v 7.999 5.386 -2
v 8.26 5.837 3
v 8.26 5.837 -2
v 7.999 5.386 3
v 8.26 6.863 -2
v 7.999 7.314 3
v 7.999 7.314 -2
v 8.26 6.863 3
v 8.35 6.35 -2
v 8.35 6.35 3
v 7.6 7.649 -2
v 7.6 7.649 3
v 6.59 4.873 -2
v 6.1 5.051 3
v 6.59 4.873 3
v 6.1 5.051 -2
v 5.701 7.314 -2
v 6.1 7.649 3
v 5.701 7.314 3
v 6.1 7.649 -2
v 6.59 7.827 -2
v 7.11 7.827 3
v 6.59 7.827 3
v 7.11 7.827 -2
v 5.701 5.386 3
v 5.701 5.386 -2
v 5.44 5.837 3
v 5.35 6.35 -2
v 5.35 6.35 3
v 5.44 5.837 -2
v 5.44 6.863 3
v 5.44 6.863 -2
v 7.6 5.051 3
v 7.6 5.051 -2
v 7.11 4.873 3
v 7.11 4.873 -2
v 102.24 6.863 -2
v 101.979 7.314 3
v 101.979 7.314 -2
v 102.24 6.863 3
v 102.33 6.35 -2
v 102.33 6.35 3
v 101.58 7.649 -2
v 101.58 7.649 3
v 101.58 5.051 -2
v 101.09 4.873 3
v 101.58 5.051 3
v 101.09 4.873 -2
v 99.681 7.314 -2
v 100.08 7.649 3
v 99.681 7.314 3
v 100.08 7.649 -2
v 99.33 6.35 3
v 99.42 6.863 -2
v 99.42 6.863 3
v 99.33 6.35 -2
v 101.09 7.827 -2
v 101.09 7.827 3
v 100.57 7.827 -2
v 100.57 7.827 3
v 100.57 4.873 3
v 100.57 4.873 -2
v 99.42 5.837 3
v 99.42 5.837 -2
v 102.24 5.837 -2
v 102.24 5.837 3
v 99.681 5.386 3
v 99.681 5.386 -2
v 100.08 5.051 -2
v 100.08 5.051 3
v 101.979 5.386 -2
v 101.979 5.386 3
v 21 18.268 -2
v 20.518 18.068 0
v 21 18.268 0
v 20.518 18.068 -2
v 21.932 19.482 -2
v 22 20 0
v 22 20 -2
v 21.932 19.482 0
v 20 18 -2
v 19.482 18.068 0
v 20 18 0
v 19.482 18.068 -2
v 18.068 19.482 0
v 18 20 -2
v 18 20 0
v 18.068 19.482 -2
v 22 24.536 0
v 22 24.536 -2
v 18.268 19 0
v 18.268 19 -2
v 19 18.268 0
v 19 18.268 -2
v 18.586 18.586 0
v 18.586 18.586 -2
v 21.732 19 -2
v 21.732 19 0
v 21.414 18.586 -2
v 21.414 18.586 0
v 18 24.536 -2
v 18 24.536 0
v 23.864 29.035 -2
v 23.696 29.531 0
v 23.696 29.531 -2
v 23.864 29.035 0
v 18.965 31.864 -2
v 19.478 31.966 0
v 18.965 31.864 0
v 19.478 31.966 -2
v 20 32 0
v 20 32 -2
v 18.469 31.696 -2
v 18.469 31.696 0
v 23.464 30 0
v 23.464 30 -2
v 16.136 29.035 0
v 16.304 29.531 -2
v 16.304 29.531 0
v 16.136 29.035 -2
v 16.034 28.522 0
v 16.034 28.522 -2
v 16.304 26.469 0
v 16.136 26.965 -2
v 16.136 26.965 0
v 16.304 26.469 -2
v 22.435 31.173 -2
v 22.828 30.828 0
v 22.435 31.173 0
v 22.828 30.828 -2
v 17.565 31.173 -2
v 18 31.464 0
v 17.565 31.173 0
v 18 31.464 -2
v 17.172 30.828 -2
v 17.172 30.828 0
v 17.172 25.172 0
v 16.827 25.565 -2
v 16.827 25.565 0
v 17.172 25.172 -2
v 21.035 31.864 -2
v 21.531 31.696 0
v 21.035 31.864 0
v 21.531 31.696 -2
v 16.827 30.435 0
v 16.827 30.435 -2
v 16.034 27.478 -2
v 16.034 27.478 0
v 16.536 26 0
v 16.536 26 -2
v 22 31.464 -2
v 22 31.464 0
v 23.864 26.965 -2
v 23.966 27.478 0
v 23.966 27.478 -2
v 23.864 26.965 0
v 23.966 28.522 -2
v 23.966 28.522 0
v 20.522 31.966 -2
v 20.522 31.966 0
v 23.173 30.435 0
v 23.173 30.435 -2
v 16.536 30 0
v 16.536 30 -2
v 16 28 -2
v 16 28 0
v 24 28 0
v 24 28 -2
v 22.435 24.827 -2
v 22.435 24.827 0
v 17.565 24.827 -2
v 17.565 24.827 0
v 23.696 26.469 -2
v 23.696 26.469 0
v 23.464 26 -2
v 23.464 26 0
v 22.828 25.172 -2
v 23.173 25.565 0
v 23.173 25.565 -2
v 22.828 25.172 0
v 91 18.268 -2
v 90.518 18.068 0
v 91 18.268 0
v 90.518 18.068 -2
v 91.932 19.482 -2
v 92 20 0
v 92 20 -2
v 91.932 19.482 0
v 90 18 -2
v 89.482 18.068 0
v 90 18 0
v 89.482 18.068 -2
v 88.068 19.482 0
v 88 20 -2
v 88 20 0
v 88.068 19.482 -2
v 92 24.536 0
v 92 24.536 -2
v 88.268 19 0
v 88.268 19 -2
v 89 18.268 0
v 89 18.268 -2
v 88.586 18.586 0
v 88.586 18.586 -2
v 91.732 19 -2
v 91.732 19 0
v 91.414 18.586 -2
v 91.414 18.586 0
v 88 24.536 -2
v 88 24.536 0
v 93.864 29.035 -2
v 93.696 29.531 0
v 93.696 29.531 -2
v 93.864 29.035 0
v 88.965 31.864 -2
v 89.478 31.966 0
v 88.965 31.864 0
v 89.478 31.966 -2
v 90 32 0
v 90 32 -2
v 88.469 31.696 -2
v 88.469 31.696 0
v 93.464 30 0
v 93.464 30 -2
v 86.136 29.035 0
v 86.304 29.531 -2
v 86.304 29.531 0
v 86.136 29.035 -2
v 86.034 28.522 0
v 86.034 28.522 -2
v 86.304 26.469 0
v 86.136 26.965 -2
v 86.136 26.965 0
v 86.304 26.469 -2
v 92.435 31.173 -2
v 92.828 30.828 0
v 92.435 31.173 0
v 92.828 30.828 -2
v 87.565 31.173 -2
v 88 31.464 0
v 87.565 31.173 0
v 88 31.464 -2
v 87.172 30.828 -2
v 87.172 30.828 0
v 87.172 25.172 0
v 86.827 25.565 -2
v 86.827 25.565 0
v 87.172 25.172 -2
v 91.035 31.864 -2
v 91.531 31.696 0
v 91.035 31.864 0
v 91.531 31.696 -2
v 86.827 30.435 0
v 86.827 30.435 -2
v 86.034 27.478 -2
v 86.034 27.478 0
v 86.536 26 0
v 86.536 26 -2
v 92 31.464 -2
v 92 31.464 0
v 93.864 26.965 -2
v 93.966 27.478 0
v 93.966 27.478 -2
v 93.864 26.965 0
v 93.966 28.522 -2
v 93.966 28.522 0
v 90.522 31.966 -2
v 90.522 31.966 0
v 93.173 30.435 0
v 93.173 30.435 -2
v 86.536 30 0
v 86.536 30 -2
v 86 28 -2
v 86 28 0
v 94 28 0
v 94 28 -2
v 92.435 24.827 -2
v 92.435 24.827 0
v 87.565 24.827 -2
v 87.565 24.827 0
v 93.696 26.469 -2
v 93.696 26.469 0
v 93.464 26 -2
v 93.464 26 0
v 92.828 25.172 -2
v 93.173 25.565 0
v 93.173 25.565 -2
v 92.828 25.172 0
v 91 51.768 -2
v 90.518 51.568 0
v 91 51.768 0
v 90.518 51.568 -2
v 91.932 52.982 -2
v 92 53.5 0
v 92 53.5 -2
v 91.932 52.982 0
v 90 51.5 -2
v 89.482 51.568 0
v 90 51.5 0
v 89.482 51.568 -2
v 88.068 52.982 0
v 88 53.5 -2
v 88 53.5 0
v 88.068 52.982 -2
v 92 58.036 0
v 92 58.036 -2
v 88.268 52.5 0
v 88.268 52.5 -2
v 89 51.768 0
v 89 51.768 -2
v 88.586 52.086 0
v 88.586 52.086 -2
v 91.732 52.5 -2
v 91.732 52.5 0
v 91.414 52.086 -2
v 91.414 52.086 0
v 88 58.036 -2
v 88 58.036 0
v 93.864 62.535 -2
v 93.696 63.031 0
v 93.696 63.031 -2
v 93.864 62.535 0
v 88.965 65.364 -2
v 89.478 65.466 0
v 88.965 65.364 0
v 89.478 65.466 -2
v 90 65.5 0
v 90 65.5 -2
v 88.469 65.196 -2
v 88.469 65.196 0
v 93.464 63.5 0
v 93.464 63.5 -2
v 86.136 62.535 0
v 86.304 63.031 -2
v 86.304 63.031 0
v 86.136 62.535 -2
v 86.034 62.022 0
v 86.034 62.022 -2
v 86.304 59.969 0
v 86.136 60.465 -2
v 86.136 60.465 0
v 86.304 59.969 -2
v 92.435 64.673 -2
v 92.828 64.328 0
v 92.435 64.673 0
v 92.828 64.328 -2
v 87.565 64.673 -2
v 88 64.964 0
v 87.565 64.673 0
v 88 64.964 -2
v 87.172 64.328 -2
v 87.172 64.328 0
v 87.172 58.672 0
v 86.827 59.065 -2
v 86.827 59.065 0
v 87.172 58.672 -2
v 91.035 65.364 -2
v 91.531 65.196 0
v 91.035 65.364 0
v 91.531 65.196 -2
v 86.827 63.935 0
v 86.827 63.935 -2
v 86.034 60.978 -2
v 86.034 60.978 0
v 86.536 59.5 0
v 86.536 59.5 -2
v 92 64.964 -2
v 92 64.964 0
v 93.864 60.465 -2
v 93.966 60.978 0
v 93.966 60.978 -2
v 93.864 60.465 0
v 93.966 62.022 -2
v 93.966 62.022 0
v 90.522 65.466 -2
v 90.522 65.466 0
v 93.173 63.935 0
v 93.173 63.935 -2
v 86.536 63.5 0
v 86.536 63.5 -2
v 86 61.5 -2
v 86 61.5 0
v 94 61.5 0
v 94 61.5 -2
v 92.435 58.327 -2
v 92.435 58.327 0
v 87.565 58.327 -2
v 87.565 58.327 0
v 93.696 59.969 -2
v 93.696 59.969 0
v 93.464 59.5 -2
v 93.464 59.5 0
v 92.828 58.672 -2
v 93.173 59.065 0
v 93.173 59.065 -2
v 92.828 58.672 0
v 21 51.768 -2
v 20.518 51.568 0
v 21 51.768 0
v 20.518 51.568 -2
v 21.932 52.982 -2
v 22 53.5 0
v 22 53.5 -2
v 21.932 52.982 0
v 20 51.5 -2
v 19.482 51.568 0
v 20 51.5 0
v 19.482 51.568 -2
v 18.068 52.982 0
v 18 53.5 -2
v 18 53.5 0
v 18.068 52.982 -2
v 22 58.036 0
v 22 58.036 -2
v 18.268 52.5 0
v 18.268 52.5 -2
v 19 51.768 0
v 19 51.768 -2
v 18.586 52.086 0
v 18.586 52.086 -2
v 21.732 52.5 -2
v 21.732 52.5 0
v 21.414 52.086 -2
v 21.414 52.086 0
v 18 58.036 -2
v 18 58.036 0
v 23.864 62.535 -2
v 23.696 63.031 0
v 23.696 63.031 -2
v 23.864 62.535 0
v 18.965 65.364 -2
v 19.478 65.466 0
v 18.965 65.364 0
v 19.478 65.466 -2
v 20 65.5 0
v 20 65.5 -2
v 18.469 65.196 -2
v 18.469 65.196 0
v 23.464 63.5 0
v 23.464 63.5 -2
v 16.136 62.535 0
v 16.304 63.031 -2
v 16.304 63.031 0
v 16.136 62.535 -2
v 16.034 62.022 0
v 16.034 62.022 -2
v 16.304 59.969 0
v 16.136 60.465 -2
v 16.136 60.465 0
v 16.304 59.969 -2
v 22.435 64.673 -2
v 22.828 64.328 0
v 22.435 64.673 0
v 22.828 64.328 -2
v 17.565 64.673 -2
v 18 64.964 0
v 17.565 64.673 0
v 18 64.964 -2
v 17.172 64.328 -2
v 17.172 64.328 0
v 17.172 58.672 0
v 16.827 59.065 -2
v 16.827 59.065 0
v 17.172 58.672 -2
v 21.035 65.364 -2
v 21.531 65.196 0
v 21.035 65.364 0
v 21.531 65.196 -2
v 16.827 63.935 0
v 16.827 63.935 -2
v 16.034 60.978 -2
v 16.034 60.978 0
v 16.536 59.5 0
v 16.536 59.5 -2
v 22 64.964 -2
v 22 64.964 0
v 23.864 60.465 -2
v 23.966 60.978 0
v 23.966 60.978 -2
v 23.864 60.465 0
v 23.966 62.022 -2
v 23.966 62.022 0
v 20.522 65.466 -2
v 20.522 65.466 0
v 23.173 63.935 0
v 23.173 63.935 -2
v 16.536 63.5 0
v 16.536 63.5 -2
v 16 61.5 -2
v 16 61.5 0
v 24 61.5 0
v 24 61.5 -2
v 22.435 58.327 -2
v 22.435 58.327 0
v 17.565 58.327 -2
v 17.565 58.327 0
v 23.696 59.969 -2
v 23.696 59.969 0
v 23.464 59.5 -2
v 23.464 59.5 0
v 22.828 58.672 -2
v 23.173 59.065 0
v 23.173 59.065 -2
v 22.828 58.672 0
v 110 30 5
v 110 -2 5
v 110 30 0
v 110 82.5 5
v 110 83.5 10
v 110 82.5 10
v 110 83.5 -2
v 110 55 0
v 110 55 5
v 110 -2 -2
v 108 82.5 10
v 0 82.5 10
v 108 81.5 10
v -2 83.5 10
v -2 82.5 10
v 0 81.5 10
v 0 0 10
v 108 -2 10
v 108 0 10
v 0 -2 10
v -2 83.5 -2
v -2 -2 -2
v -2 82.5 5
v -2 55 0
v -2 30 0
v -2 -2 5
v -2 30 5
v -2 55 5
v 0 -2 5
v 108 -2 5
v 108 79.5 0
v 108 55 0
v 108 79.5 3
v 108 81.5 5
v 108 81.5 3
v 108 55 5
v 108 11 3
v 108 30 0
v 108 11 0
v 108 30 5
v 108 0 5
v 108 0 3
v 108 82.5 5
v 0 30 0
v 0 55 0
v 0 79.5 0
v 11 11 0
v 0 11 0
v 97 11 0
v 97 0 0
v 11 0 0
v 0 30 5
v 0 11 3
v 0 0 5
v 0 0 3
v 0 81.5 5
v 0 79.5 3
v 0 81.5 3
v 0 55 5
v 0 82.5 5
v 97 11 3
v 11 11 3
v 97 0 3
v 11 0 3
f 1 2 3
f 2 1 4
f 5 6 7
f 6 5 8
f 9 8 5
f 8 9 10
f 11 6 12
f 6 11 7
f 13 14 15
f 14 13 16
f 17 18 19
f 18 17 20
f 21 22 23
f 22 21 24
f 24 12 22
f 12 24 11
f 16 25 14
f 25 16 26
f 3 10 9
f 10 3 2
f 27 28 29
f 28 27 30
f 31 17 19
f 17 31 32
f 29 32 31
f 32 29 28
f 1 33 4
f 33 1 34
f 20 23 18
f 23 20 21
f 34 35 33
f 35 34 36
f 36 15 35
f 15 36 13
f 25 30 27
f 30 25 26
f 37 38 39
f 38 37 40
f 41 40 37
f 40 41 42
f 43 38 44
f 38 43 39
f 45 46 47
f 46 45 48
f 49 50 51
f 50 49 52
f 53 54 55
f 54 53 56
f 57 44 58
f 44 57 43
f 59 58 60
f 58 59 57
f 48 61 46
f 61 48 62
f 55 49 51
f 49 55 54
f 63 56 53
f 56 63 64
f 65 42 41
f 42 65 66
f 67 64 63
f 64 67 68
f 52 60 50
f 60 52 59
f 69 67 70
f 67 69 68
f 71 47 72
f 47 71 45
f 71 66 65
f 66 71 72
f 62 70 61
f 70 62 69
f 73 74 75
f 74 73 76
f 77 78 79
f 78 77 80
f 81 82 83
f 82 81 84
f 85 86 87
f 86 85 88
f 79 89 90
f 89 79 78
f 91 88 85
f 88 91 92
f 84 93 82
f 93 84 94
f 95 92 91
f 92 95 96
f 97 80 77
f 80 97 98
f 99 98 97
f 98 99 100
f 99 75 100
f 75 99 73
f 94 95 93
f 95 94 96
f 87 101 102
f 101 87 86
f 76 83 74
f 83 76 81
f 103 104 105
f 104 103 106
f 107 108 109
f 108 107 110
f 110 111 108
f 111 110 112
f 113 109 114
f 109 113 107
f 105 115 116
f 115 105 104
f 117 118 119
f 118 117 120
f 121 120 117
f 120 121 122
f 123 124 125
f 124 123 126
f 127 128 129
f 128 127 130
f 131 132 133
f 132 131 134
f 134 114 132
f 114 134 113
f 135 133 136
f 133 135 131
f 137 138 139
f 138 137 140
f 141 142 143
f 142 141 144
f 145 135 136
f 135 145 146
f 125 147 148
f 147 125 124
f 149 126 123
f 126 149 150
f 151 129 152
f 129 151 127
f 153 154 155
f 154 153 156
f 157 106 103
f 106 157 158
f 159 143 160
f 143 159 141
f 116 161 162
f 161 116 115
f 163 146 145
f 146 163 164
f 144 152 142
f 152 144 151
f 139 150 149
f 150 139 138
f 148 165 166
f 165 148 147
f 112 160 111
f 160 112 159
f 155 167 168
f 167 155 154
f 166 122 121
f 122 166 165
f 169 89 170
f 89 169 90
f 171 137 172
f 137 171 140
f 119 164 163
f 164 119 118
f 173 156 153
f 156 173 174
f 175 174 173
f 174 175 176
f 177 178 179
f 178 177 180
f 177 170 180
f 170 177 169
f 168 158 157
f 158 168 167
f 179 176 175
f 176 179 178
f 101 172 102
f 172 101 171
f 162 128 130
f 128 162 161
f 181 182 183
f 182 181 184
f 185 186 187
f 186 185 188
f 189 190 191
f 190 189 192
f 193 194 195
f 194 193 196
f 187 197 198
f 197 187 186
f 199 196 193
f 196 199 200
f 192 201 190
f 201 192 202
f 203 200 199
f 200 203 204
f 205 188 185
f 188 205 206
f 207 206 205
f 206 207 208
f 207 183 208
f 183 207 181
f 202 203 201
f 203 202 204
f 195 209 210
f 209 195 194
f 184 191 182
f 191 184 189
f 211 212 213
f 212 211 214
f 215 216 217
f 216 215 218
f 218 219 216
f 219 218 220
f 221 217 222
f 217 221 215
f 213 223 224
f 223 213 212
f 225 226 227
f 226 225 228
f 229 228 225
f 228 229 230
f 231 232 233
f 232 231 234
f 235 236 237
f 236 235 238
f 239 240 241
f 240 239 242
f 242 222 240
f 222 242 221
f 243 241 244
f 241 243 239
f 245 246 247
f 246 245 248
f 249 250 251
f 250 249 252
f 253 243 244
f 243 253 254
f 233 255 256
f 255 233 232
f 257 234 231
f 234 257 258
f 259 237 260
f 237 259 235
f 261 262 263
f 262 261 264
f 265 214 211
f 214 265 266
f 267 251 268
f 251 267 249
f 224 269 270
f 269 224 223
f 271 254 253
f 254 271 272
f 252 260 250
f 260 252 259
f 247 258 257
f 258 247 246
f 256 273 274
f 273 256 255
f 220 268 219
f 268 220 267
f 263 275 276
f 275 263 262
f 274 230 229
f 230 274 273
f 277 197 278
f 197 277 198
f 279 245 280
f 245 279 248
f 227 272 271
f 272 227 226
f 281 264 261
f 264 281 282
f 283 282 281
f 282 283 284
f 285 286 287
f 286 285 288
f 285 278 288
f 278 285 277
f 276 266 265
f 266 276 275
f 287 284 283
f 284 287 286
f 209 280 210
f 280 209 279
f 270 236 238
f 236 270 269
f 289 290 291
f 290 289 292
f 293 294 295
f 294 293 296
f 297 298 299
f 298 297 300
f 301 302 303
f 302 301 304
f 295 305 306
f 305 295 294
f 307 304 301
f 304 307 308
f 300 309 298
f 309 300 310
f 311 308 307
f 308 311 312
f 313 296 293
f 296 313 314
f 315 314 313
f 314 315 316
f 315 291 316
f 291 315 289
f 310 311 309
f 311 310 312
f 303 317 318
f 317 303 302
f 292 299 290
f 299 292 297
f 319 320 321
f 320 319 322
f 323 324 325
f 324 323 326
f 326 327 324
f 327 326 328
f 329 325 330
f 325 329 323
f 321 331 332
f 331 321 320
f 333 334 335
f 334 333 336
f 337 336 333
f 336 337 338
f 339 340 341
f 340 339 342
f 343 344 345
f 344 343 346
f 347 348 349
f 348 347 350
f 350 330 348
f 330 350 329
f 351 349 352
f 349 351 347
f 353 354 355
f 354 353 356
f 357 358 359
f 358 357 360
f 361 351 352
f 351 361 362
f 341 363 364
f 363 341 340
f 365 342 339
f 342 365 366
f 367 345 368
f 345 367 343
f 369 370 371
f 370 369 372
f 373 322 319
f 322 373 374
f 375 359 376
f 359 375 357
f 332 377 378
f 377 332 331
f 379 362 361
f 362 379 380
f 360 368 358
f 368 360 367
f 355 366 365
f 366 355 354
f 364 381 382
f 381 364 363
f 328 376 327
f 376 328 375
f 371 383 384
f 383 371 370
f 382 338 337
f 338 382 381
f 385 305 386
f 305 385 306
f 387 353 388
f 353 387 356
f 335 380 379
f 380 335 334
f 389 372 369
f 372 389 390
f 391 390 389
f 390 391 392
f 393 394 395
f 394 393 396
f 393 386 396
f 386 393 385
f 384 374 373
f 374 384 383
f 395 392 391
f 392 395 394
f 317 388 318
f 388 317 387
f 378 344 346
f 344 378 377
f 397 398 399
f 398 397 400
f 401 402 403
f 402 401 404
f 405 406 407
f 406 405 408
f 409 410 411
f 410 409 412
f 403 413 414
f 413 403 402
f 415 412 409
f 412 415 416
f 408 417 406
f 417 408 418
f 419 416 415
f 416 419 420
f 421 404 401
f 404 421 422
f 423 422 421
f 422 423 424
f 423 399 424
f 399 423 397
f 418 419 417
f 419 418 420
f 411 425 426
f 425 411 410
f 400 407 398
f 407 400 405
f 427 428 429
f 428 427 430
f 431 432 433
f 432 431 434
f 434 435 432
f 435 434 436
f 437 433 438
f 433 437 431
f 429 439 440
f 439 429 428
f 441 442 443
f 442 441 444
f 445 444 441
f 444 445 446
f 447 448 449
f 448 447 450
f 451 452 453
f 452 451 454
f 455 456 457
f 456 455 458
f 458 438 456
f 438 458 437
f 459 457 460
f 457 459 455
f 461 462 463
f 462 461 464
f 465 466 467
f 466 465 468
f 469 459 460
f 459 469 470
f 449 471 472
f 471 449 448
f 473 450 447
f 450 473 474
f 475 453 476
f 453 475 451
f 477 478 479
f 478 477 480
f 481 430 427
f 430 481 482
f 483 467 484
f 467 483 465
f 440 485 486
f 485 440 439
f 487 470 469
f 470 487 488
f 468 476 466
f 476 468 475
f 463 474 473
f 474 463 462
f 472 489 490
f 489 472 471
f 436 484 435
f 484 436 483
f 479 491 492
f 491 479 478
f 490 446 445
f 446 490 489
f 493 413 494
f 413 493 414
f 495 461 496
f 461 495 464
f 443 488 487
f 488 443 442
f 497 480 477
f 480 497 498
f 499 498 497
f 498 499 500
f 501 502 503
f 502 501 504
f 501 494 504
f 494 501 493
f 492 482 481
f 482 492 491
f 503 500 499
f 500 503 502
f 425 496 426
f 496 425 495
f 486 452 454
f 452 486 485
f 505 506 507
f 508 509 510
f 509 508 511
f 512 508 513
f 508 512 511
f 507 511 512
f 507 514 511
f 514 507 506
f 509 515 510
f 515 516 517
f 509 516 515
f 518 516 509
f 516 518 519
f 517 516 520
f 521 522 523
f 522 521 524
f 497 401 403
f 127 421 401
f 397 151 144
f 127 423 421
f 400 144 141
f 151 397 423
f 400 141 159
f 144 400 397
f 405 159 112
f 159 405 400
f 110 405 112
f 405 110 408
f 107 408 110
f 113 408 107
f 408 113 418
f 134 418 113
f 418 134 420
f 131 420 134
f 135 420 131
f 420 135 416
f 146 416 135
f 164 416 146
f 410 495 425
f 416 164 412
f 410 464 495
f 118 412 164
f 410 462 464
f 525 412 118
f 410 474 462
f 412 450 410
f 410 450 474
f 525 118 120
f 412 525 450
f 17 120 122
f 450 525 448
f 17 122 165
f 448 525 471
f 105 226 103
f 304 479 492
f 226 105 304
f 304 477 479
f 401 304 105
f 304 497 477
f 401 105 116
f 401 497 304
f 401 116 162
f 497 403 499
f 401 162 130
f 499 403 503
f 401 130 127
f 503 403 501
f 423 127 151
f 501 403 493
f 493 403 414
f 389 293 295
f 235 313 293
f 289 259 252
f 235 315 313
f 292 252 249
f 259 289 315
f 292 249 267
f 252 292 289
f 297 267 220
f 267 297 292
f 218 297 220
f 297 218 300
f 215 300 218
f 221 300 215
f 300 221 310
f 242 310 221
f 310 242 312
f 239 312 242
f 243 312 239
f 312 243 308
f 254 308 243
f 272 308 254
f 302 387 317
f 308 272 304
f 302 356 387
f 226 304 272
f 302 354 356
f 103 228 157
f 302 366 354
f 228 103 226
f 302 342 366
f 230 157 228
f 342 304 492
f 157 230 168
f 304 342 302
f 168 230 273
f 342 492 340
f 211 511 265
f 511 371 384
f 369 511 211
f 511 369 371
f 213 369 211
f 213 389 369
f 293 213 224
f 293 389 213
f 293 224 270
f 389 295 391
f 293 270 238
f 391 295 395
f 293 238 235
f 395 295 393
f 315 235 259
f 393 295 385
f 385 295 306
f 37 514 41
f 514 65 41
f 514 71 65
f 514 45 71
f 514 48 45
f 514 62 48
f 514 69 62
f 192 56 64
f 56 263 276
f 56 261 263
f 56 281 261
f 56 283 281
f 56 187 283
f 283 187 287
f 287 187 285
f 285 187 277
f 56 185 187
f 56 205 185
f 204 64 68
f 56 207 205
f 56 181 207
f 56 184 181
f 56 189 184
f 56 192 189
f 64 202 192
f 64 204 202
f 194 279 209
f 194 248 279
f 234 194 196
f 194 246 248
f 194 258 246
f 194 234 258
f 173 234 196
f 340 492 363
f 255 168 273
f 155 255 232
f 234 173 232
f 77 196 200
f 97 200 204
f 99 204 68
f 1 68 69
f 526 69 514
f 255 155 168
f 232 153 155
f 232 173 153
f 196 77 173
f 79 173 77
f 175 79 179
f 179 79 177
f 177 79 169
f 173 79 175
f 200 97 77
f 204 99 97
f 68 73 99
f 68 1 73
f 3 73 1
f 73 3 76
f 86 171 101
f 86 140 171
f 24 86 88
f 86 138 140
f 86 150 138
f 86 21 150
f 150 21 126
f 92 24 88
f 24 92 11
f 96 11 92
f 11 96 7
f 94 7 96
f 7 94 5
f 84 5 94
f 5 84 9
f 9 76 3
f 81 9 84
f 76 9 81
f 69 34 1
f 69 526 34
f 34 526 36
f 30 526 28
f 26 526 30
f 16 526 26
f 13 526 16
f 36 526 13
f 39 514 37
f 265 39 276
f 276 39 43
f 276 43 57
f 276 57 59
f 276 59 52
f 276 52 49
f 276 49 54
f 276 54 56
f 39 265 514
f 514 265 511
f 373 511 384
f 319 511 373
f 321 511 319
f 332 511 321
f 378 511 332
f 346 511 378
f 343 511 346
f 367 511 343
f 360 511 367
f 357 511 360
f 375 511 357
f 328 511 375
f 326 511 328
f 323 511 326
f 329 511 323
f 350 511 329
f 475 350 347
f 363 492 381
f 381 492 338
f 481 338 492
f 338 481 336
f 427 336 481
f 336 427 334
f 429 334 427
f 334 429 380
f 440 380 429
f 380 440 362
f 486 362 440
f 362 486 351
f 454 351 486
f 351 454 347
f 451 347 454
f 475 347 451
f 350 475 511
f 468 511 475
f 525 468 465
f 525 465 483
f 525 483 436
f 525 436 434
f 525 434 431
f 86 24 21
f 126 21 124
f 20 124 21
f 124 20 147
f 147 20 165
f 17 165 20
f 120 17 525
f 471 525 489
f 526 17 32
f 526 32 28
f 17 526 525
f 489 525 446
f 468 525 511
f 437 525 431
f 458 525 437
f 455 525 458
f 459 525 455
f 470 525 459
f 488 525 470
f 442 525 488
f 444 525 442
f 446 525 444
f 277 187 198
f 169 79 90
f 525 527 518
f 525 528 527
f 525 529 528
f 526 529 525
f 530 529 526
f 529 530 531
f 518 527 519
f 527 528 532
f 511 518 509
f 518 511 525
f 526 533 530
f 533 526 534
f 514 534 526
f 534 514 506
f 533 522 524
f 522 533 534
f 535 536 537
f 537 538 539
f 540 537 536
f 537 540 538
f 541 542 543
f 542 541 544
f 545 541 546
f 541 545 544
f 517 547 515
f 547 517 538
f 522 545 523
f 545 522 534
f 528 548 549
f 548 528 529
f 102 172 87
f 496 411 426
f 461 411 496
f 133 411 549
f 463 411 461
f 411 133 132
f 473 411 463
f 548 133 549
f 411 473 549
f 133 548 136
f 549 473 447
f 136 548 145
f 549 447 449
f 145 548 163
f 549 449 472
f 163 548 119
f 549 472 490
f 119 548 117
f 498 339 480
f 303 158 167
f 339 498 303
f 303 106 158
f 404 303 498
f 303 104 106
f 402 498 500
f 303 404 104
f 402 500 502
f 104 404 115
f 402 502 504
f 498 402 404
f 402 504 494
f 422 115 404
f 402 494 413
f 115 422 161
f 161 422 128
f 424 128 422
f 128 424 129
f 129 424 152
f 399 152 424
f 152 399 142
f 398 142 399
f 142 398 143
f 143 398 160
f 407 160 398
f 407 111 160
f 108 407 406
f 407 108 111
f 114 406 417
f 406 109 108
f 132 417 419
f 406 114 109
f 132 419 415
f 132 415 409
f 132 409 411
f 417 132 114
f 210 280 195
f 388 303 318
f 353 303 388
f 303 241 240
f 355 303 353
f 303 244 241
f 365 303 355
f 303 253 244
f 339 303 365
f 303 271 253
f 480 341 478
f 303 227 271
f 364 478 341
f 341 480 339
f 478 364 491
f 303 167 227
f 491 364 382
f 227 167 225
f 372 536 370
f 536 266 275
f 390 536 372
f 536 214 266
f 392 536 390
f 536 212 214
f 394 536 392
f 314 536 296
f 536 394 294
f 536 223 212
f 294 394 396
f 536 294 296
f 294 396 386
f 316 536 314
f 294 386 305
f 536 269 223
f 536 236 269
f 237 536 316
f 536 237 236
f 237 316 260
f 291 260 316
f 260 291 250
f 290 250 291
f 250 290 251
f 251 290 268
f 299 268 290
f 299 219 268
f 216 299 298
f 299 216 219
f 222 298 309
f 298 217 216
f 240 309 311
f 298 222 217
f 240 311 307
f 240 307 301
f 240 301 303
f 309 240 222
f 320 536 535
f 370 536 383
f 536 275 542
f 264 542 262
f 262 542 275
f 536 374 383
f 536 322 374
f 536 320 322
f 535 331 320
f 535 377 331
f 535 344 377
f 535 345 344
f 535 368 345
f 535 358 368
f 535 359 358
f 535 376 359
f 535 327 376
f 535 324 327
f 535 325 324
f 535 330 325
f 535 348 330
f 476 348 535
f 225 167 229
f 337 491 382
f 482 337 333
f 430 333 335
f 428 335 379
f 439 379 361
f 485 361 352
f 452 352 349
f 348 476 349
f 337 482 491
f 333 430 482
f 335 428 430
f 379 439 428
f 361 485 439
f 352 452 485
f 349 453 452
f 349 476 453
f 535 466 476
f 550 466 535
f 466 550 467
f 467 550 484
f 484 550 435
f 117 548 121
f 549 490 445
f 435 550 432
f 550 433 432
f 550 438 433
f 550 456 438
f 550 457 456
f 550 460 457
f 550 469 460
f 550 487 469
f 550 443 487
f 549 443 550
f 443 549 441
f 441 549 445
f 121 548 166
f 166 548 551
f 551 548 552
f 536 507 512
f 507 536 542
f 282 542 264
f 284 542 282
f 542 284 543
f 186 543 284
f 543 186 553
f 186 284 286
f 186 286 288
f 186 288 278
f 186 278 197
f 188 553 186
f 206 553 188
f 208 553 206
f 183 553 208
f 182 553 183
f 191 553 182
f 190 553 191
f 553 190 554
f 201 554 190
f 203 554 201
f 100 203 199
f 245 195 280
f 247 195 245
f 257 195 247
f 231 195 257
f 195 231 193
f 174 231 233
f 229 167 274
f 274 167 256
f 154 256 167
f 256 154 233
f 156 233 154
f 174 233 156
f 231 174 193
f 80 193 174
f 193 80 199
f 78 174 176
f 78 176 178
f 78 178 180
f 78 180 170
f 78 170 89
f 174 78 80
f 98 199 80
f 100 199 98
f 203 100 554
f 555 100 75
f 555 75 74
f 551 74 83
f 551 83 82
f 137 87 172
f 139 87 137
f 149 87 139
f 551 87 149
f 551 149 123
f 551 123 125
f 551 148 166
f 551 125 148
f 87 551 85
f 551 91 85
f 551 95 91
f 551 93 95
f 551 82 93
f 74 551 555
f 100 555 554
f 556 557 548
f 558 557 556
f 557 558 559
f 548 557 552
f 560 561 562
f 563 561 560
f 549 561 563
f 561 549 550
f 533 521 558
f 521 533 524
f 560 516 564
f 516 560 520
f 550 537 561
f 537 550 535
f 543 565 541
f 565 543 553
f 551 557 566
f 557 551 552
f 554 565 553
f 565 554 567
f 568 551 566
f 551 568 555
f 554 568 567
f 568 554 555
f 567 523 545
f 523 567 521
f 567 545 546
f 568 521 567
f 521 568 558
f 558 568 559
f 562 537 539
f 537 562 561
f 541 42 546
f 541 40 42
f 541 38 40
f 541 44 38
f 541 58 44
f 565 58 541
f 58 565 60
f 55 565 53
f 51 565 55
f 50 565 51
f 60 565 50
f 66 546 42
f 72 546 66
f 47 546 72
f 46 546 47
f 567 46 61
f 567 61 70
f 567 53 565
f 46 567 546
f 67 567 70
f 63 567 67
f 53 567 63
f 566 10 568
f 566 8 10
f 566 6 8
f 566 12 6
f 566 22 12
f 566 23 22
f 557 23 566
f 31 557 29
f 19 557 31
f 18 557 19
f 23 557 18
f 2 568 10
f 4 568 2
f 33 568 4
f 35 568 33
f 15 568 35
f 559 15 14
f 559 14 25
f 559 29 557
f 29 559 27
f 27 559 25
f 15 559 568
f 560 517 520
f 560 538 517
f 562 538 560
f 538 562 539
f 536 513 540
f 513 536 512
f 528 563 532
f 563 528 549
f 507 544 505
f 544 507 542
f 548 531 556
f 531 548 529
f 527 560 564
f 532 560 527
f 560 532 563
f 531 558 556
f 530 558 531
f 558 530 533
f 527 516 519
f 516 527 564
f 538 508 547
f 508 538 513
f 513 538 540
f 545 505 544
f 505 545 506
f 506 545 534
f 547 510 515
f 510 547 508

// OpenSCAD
// file: atis_lib.scad
// Gyűrű fix falvastagsággal. Ez az eredeti. Nem változtatom meg, mert több helyen már használom
module gyuru(r1, r2,h, w, center=false){
    difference(){
        cylinder(r1=r1,r2=r2,h, center=center, $fn=12*r1);
        translate([0,0,-0.1])cylinder(r1=r1-w, r2=r2-w,h+0.2, center=center, $fn=12*(r1-w)); // trükközés: már preview-ban is normálisan jelenjen meg a gyűrű
    }
}

// Gyűrű fix belső átmérővel

module gyuru_fixrb(r1, r2, h, r_belso, center=false){
    difference(){
        cylinder(r1=r1, r2=r2, h, center=center, $fn=12*r1);
        translate([0,0,-0.1])cylinder(r=r_belso, h+0.2, center=center, $fn=12*r_belso);
    }
    
}

//inset_width= min(nozzle dia/2, 0.4)
module inset_first_layer(inset_height=0.31,inset_width=0.2, render=false)
{   
    if (render == true){
        difference()
        { 
            children();

            translate([0,0,-1])
            linear_extrude(height=inset_height+1)
            difference()
            {
                offset(r = inset_width) 
                projection(cut=true) 
                translate([0,0,-inset_height])
                children();

                offset(r = -inset_width) 
                projection(cut=true) 
                translate([0,0,-inset_height])
                children();
            }
        } 
    }
    else{
        echo("Inset not rendered!");
    }
} 

module deszka(m, sz, v, vastagsag, cimke){
    cube([m,sz,v], center=true);
    if (m == vastagsag){
        t = sz * v;
        echo(cimke, m , sz, v, t/1000/1000);
    } else if (sz == vastagsag){
            t = m*v;
            echo(cimke, m , sz, v, t/1000/1000);
    } else if (v == vastagsag){
            t = m*sz;
            echo(cimke, m , sz, v, t/1000/1000);
    }
    echo(cimke, m , sz, v, t);
}



// csm=[melyseg, szelesseg, magassag, also resz magassag, ,henger sugara

//csatlakozo([5,10,20,2,2,1.5]);

module csatlakozo(csm){
    cw = csm[0];
    sz = csm[1];
    h = csm[2];
    ch = csm[3];
    ny = csm[4];
    R=csm[5];
    translate([-cw/2, -sz/2, -h/2]){
        cube([cw,sz,ch]);
        translate([0,sz,ch])
            rotate([90,0,0])
                linear_extrude(height=sz)polygon([[0,0], [cw, 0], [0,cw+1], [0,0]]);
        translate([0,(sz-ny)/2,0])
        intersection()
        {
            translate([0,R+ny/2,0])
                rotate([90,0,0])
                    linear_extrude(height=2*R)polygon([[0,0], [cw, 0], [cw, h-cw-1], [0,h], [0,0]]);
            union(){
                cube([cw-R,ny, h]);
                translate([cw-R-0.5,ny/2,0]) cylinder(r=R, h=h,$fn=80);
            }
        }
    }
}

module gombolyitett_csatlakozo(csm){
    cw = csm[0]-1;
    sz = csm[1]-2;
    h = csm[2]-2;
    ch = csm[3];
    ny = csm[4];
    R=csm[5];
    translate([-cw/2, -sz/2, -h/2]){
        cube([cw,sz,ch]);
        translate([0,sz,ch])
            rotate([90,0,0])
                linear_extrude(height=sz)polygon([[0,0], [cw, 0], [0,cw+1], [0,0]]);
        translate([0,(sz-ny)/2,0])
        intersection()
        {
            translate([0,R+ny/2,0])
                rotate([90,0,0])
                    linear_extrude(height=2*R)polygon([[0,0], [cw, 0], [cw, h-cw-1], [0,h], [0,0]]);
            union(){
                cube([ny, ny,h]);
                translate([cw-R-0.5,ny/2,0]) cylinder(r=R, h=h,$fn=80);
            }
        }
    }
}

module kivagas(l, d, w){
    hull(){
        cylinder(r=d/2,h = w-2, $fn=12*d/2);
        translate([l-d,0,0])cylinder(r=d/2, h=w-2, $fn=12*d/2);
    }
    translate([0,0,w-2])hull(){
        cylinder(r1=d/2, r2=d/2+2,h = 2, $fn=12*d/2);
        translate([l-d,0,0])cylinder(r1=d/2, r2=d/2+2, h=2, $fn=12*d/2);
    }
}

function shelly1L_befoglalo() = [44, 38, 14];
function shellyRGBW2_befoglalo() = shelly1L_befoglalo();

module shellyRGBW2(){
    shelly1L();
}

module shelly1L(){
    b = shelly1L_befoglalo();
    s_h = b[2];
    s_w = b[0];
    s_d = b[1];
    module lecsapott_sarok(){
        echo(s_h);
        linear_extrude(height=s_h)polygon([[0,0],[0,11],[11,0],[0,0]]);
    }
    difference(){
        cube([s_w,s_d,s_h]);
        lecsapott_sarok();
        translate([s_w,0,0])rotate(90)lecsapott_sarok();
    }
    
}

module keyhole_hanger(r1, r2, h){
    dist = 2 * r1 + r2;
    hull(){
        cylinder(r=r1, h, $fn=12*r1);
        translate([dist, 0,0])cylinder(r=r1, h, $fn=12*r1);
    }
    translate([dist, 0, 0])cylinder(r=r2, h, $fn=12*r2);
    
}
// main file
use <atis_lib.scad>

pcb_w = 107;
pcb_d = 80.5;
pcb_h = 2;
pcb_hezag = 0.5;
pin_h = 3;
part_h = 18;
grove_d = 2; // vályat oldalon ilyen mély bemarás kell

screwhole_tamasz = 10+2*pcb_hezag; // a furatlyuk felfekvésének oldalhoszza. Négyzettel számolunk.
ww = 2; // A doboz falvastagsága
karima = 5;
tures=0;


// Két részből rakjuk össze: a PCB felső síkjáig tart az egyik és onnan folytatódik a teteje


teljes_w = pcb_w + 2 * pcb_hezag + 2 * ww;
teljes_d = pcb_d + 2 * pcb_hezag + 2 * ww;
also_h = ww + pin_h + pcb_h + karima;
felso_h = part_h + ww;

//felso_fel();
//translate([110,100,0])
also_fel();

module also_fel(){
    difference(){
        translate([-ww, -ww, -ww])cube([teljes_w, teljes_d, also_h]);
        
        translate([0, screwhole_tamasz,0])cube([pcb_w+2*pcb_hezag, pcb_d-grove_d+2*pcb_hezag-screwhole_tamasz,pin_h+3]);
        translate([screwhole_tamasz,0,0])cube([pcb_w+2*pcb_hezag-2*screwhole_tamasz, screwhole_tamasz,pin_h+3]);
        translate([0,0,pin_h])cube([pcb_w+2*pcb_hezag, pcb_d+2*pcb_hezag, pcb_h+karima +.1]);
        translate([-ww,30,])cube([teljes_w, 25, also_h]);
        translate([-ww,-ww,pin_h+pcb_h])cube([ww+tures,pcb_d+2*ww,karima]);
        translate([pcb_w-tures+2*pcb_hezag,-ww,pin_h+pcb_h])cube([ww+tures,pcb_d+2*ww,karima]);
        for(x = [6.35+pcb_hezag, 100.33+pcb_hezag]){
            #translate([x, 6.35, -ww-1])cylinder(h=50, r=1.5, $fn=1.5*12);
        }
        hx1 = 20;
        hy1 = 20;
        hx2 = teljes_w-20-ww;
        hy2 = teljes_d-ww-30;
        hangers = [[hx1, hy1],
                   [hx2, hy1],
                   [hx2, hy2],
                   [hx1, hy2]];
    
        for(x = hangers){
            translate([x[0],x[1],-ww-.1])
                rotate(90)keyhole_hanger(2,4,10);
        }

    }

/*
    for(x = [0, pcb_w-screwhole_tamasz]){
        translate([x+pcb_hezag,pcb_hezag,0])
            difference(){
                cube([screwhole_tamasz, screwhole_tamasz, pin_h]);
                translate([screwhole_tamasz/2, screwhole_tamasz/2, 0])cylinder(h=50, r=1.5, $fn=1.5*12);
            }
    }*/
    //translate([0, pcb_d+ww-2,pin_h+pcb_h])rotate(-90)trapez(tures=tures);
}

//pcb maga
//translate([pcb_hezag, pcb_hezag, pin_h])cube([pcb_w, pcb_d, pcb_h]);

module felso_fel(){
    difference(){
        translate([-ww, -ww, -ww])cube([teljes_w, teljes_d, felso_h]);
        cube([pcb_w, pcb_d-grove_d, part_h]);
        translate([0, pcb_d-grove_d-18,-ww])cube([pcb_w, 18, ww+1]);
        translate([0, 0, -ww])cube([pcb_w, 34, ww+1]);    
        translate([0, pcb_d, felso_h-karima-ww])cube([pcb_w, ww, karima]);
        translate([tures,-ww,part_h-karima-tures])cube([pcb_w - 2*tures, ww, karima+pcb_h]);
    }
    for(x = [0, pcb_w-screwhole_tamasz]){
        translate([x,0,-ww])
            difference(){
                cube([screwhole_tamasz, screwhole_tamasz, part_h+ww]);
                translate([screwhole_tamasz/2, screwhole_tamasz/2, -1])cylinder(h=50, r=2.5, $fn=2.5*12);
            }
    }
    //translate([pcb_w,pcb_d,part_h-karima])rotate(90)trapez();
    
}

module trapez(tures=0){
    pontok = [[0,0],
              [0,karima],
              [ww-2, karima],
              [0,0]
    ];
    translate([0, pcb_w-tures, 0])rotate([90,0,0])linear_extrude(height=pcb_w-2*tures)polygon(pontok);
}
